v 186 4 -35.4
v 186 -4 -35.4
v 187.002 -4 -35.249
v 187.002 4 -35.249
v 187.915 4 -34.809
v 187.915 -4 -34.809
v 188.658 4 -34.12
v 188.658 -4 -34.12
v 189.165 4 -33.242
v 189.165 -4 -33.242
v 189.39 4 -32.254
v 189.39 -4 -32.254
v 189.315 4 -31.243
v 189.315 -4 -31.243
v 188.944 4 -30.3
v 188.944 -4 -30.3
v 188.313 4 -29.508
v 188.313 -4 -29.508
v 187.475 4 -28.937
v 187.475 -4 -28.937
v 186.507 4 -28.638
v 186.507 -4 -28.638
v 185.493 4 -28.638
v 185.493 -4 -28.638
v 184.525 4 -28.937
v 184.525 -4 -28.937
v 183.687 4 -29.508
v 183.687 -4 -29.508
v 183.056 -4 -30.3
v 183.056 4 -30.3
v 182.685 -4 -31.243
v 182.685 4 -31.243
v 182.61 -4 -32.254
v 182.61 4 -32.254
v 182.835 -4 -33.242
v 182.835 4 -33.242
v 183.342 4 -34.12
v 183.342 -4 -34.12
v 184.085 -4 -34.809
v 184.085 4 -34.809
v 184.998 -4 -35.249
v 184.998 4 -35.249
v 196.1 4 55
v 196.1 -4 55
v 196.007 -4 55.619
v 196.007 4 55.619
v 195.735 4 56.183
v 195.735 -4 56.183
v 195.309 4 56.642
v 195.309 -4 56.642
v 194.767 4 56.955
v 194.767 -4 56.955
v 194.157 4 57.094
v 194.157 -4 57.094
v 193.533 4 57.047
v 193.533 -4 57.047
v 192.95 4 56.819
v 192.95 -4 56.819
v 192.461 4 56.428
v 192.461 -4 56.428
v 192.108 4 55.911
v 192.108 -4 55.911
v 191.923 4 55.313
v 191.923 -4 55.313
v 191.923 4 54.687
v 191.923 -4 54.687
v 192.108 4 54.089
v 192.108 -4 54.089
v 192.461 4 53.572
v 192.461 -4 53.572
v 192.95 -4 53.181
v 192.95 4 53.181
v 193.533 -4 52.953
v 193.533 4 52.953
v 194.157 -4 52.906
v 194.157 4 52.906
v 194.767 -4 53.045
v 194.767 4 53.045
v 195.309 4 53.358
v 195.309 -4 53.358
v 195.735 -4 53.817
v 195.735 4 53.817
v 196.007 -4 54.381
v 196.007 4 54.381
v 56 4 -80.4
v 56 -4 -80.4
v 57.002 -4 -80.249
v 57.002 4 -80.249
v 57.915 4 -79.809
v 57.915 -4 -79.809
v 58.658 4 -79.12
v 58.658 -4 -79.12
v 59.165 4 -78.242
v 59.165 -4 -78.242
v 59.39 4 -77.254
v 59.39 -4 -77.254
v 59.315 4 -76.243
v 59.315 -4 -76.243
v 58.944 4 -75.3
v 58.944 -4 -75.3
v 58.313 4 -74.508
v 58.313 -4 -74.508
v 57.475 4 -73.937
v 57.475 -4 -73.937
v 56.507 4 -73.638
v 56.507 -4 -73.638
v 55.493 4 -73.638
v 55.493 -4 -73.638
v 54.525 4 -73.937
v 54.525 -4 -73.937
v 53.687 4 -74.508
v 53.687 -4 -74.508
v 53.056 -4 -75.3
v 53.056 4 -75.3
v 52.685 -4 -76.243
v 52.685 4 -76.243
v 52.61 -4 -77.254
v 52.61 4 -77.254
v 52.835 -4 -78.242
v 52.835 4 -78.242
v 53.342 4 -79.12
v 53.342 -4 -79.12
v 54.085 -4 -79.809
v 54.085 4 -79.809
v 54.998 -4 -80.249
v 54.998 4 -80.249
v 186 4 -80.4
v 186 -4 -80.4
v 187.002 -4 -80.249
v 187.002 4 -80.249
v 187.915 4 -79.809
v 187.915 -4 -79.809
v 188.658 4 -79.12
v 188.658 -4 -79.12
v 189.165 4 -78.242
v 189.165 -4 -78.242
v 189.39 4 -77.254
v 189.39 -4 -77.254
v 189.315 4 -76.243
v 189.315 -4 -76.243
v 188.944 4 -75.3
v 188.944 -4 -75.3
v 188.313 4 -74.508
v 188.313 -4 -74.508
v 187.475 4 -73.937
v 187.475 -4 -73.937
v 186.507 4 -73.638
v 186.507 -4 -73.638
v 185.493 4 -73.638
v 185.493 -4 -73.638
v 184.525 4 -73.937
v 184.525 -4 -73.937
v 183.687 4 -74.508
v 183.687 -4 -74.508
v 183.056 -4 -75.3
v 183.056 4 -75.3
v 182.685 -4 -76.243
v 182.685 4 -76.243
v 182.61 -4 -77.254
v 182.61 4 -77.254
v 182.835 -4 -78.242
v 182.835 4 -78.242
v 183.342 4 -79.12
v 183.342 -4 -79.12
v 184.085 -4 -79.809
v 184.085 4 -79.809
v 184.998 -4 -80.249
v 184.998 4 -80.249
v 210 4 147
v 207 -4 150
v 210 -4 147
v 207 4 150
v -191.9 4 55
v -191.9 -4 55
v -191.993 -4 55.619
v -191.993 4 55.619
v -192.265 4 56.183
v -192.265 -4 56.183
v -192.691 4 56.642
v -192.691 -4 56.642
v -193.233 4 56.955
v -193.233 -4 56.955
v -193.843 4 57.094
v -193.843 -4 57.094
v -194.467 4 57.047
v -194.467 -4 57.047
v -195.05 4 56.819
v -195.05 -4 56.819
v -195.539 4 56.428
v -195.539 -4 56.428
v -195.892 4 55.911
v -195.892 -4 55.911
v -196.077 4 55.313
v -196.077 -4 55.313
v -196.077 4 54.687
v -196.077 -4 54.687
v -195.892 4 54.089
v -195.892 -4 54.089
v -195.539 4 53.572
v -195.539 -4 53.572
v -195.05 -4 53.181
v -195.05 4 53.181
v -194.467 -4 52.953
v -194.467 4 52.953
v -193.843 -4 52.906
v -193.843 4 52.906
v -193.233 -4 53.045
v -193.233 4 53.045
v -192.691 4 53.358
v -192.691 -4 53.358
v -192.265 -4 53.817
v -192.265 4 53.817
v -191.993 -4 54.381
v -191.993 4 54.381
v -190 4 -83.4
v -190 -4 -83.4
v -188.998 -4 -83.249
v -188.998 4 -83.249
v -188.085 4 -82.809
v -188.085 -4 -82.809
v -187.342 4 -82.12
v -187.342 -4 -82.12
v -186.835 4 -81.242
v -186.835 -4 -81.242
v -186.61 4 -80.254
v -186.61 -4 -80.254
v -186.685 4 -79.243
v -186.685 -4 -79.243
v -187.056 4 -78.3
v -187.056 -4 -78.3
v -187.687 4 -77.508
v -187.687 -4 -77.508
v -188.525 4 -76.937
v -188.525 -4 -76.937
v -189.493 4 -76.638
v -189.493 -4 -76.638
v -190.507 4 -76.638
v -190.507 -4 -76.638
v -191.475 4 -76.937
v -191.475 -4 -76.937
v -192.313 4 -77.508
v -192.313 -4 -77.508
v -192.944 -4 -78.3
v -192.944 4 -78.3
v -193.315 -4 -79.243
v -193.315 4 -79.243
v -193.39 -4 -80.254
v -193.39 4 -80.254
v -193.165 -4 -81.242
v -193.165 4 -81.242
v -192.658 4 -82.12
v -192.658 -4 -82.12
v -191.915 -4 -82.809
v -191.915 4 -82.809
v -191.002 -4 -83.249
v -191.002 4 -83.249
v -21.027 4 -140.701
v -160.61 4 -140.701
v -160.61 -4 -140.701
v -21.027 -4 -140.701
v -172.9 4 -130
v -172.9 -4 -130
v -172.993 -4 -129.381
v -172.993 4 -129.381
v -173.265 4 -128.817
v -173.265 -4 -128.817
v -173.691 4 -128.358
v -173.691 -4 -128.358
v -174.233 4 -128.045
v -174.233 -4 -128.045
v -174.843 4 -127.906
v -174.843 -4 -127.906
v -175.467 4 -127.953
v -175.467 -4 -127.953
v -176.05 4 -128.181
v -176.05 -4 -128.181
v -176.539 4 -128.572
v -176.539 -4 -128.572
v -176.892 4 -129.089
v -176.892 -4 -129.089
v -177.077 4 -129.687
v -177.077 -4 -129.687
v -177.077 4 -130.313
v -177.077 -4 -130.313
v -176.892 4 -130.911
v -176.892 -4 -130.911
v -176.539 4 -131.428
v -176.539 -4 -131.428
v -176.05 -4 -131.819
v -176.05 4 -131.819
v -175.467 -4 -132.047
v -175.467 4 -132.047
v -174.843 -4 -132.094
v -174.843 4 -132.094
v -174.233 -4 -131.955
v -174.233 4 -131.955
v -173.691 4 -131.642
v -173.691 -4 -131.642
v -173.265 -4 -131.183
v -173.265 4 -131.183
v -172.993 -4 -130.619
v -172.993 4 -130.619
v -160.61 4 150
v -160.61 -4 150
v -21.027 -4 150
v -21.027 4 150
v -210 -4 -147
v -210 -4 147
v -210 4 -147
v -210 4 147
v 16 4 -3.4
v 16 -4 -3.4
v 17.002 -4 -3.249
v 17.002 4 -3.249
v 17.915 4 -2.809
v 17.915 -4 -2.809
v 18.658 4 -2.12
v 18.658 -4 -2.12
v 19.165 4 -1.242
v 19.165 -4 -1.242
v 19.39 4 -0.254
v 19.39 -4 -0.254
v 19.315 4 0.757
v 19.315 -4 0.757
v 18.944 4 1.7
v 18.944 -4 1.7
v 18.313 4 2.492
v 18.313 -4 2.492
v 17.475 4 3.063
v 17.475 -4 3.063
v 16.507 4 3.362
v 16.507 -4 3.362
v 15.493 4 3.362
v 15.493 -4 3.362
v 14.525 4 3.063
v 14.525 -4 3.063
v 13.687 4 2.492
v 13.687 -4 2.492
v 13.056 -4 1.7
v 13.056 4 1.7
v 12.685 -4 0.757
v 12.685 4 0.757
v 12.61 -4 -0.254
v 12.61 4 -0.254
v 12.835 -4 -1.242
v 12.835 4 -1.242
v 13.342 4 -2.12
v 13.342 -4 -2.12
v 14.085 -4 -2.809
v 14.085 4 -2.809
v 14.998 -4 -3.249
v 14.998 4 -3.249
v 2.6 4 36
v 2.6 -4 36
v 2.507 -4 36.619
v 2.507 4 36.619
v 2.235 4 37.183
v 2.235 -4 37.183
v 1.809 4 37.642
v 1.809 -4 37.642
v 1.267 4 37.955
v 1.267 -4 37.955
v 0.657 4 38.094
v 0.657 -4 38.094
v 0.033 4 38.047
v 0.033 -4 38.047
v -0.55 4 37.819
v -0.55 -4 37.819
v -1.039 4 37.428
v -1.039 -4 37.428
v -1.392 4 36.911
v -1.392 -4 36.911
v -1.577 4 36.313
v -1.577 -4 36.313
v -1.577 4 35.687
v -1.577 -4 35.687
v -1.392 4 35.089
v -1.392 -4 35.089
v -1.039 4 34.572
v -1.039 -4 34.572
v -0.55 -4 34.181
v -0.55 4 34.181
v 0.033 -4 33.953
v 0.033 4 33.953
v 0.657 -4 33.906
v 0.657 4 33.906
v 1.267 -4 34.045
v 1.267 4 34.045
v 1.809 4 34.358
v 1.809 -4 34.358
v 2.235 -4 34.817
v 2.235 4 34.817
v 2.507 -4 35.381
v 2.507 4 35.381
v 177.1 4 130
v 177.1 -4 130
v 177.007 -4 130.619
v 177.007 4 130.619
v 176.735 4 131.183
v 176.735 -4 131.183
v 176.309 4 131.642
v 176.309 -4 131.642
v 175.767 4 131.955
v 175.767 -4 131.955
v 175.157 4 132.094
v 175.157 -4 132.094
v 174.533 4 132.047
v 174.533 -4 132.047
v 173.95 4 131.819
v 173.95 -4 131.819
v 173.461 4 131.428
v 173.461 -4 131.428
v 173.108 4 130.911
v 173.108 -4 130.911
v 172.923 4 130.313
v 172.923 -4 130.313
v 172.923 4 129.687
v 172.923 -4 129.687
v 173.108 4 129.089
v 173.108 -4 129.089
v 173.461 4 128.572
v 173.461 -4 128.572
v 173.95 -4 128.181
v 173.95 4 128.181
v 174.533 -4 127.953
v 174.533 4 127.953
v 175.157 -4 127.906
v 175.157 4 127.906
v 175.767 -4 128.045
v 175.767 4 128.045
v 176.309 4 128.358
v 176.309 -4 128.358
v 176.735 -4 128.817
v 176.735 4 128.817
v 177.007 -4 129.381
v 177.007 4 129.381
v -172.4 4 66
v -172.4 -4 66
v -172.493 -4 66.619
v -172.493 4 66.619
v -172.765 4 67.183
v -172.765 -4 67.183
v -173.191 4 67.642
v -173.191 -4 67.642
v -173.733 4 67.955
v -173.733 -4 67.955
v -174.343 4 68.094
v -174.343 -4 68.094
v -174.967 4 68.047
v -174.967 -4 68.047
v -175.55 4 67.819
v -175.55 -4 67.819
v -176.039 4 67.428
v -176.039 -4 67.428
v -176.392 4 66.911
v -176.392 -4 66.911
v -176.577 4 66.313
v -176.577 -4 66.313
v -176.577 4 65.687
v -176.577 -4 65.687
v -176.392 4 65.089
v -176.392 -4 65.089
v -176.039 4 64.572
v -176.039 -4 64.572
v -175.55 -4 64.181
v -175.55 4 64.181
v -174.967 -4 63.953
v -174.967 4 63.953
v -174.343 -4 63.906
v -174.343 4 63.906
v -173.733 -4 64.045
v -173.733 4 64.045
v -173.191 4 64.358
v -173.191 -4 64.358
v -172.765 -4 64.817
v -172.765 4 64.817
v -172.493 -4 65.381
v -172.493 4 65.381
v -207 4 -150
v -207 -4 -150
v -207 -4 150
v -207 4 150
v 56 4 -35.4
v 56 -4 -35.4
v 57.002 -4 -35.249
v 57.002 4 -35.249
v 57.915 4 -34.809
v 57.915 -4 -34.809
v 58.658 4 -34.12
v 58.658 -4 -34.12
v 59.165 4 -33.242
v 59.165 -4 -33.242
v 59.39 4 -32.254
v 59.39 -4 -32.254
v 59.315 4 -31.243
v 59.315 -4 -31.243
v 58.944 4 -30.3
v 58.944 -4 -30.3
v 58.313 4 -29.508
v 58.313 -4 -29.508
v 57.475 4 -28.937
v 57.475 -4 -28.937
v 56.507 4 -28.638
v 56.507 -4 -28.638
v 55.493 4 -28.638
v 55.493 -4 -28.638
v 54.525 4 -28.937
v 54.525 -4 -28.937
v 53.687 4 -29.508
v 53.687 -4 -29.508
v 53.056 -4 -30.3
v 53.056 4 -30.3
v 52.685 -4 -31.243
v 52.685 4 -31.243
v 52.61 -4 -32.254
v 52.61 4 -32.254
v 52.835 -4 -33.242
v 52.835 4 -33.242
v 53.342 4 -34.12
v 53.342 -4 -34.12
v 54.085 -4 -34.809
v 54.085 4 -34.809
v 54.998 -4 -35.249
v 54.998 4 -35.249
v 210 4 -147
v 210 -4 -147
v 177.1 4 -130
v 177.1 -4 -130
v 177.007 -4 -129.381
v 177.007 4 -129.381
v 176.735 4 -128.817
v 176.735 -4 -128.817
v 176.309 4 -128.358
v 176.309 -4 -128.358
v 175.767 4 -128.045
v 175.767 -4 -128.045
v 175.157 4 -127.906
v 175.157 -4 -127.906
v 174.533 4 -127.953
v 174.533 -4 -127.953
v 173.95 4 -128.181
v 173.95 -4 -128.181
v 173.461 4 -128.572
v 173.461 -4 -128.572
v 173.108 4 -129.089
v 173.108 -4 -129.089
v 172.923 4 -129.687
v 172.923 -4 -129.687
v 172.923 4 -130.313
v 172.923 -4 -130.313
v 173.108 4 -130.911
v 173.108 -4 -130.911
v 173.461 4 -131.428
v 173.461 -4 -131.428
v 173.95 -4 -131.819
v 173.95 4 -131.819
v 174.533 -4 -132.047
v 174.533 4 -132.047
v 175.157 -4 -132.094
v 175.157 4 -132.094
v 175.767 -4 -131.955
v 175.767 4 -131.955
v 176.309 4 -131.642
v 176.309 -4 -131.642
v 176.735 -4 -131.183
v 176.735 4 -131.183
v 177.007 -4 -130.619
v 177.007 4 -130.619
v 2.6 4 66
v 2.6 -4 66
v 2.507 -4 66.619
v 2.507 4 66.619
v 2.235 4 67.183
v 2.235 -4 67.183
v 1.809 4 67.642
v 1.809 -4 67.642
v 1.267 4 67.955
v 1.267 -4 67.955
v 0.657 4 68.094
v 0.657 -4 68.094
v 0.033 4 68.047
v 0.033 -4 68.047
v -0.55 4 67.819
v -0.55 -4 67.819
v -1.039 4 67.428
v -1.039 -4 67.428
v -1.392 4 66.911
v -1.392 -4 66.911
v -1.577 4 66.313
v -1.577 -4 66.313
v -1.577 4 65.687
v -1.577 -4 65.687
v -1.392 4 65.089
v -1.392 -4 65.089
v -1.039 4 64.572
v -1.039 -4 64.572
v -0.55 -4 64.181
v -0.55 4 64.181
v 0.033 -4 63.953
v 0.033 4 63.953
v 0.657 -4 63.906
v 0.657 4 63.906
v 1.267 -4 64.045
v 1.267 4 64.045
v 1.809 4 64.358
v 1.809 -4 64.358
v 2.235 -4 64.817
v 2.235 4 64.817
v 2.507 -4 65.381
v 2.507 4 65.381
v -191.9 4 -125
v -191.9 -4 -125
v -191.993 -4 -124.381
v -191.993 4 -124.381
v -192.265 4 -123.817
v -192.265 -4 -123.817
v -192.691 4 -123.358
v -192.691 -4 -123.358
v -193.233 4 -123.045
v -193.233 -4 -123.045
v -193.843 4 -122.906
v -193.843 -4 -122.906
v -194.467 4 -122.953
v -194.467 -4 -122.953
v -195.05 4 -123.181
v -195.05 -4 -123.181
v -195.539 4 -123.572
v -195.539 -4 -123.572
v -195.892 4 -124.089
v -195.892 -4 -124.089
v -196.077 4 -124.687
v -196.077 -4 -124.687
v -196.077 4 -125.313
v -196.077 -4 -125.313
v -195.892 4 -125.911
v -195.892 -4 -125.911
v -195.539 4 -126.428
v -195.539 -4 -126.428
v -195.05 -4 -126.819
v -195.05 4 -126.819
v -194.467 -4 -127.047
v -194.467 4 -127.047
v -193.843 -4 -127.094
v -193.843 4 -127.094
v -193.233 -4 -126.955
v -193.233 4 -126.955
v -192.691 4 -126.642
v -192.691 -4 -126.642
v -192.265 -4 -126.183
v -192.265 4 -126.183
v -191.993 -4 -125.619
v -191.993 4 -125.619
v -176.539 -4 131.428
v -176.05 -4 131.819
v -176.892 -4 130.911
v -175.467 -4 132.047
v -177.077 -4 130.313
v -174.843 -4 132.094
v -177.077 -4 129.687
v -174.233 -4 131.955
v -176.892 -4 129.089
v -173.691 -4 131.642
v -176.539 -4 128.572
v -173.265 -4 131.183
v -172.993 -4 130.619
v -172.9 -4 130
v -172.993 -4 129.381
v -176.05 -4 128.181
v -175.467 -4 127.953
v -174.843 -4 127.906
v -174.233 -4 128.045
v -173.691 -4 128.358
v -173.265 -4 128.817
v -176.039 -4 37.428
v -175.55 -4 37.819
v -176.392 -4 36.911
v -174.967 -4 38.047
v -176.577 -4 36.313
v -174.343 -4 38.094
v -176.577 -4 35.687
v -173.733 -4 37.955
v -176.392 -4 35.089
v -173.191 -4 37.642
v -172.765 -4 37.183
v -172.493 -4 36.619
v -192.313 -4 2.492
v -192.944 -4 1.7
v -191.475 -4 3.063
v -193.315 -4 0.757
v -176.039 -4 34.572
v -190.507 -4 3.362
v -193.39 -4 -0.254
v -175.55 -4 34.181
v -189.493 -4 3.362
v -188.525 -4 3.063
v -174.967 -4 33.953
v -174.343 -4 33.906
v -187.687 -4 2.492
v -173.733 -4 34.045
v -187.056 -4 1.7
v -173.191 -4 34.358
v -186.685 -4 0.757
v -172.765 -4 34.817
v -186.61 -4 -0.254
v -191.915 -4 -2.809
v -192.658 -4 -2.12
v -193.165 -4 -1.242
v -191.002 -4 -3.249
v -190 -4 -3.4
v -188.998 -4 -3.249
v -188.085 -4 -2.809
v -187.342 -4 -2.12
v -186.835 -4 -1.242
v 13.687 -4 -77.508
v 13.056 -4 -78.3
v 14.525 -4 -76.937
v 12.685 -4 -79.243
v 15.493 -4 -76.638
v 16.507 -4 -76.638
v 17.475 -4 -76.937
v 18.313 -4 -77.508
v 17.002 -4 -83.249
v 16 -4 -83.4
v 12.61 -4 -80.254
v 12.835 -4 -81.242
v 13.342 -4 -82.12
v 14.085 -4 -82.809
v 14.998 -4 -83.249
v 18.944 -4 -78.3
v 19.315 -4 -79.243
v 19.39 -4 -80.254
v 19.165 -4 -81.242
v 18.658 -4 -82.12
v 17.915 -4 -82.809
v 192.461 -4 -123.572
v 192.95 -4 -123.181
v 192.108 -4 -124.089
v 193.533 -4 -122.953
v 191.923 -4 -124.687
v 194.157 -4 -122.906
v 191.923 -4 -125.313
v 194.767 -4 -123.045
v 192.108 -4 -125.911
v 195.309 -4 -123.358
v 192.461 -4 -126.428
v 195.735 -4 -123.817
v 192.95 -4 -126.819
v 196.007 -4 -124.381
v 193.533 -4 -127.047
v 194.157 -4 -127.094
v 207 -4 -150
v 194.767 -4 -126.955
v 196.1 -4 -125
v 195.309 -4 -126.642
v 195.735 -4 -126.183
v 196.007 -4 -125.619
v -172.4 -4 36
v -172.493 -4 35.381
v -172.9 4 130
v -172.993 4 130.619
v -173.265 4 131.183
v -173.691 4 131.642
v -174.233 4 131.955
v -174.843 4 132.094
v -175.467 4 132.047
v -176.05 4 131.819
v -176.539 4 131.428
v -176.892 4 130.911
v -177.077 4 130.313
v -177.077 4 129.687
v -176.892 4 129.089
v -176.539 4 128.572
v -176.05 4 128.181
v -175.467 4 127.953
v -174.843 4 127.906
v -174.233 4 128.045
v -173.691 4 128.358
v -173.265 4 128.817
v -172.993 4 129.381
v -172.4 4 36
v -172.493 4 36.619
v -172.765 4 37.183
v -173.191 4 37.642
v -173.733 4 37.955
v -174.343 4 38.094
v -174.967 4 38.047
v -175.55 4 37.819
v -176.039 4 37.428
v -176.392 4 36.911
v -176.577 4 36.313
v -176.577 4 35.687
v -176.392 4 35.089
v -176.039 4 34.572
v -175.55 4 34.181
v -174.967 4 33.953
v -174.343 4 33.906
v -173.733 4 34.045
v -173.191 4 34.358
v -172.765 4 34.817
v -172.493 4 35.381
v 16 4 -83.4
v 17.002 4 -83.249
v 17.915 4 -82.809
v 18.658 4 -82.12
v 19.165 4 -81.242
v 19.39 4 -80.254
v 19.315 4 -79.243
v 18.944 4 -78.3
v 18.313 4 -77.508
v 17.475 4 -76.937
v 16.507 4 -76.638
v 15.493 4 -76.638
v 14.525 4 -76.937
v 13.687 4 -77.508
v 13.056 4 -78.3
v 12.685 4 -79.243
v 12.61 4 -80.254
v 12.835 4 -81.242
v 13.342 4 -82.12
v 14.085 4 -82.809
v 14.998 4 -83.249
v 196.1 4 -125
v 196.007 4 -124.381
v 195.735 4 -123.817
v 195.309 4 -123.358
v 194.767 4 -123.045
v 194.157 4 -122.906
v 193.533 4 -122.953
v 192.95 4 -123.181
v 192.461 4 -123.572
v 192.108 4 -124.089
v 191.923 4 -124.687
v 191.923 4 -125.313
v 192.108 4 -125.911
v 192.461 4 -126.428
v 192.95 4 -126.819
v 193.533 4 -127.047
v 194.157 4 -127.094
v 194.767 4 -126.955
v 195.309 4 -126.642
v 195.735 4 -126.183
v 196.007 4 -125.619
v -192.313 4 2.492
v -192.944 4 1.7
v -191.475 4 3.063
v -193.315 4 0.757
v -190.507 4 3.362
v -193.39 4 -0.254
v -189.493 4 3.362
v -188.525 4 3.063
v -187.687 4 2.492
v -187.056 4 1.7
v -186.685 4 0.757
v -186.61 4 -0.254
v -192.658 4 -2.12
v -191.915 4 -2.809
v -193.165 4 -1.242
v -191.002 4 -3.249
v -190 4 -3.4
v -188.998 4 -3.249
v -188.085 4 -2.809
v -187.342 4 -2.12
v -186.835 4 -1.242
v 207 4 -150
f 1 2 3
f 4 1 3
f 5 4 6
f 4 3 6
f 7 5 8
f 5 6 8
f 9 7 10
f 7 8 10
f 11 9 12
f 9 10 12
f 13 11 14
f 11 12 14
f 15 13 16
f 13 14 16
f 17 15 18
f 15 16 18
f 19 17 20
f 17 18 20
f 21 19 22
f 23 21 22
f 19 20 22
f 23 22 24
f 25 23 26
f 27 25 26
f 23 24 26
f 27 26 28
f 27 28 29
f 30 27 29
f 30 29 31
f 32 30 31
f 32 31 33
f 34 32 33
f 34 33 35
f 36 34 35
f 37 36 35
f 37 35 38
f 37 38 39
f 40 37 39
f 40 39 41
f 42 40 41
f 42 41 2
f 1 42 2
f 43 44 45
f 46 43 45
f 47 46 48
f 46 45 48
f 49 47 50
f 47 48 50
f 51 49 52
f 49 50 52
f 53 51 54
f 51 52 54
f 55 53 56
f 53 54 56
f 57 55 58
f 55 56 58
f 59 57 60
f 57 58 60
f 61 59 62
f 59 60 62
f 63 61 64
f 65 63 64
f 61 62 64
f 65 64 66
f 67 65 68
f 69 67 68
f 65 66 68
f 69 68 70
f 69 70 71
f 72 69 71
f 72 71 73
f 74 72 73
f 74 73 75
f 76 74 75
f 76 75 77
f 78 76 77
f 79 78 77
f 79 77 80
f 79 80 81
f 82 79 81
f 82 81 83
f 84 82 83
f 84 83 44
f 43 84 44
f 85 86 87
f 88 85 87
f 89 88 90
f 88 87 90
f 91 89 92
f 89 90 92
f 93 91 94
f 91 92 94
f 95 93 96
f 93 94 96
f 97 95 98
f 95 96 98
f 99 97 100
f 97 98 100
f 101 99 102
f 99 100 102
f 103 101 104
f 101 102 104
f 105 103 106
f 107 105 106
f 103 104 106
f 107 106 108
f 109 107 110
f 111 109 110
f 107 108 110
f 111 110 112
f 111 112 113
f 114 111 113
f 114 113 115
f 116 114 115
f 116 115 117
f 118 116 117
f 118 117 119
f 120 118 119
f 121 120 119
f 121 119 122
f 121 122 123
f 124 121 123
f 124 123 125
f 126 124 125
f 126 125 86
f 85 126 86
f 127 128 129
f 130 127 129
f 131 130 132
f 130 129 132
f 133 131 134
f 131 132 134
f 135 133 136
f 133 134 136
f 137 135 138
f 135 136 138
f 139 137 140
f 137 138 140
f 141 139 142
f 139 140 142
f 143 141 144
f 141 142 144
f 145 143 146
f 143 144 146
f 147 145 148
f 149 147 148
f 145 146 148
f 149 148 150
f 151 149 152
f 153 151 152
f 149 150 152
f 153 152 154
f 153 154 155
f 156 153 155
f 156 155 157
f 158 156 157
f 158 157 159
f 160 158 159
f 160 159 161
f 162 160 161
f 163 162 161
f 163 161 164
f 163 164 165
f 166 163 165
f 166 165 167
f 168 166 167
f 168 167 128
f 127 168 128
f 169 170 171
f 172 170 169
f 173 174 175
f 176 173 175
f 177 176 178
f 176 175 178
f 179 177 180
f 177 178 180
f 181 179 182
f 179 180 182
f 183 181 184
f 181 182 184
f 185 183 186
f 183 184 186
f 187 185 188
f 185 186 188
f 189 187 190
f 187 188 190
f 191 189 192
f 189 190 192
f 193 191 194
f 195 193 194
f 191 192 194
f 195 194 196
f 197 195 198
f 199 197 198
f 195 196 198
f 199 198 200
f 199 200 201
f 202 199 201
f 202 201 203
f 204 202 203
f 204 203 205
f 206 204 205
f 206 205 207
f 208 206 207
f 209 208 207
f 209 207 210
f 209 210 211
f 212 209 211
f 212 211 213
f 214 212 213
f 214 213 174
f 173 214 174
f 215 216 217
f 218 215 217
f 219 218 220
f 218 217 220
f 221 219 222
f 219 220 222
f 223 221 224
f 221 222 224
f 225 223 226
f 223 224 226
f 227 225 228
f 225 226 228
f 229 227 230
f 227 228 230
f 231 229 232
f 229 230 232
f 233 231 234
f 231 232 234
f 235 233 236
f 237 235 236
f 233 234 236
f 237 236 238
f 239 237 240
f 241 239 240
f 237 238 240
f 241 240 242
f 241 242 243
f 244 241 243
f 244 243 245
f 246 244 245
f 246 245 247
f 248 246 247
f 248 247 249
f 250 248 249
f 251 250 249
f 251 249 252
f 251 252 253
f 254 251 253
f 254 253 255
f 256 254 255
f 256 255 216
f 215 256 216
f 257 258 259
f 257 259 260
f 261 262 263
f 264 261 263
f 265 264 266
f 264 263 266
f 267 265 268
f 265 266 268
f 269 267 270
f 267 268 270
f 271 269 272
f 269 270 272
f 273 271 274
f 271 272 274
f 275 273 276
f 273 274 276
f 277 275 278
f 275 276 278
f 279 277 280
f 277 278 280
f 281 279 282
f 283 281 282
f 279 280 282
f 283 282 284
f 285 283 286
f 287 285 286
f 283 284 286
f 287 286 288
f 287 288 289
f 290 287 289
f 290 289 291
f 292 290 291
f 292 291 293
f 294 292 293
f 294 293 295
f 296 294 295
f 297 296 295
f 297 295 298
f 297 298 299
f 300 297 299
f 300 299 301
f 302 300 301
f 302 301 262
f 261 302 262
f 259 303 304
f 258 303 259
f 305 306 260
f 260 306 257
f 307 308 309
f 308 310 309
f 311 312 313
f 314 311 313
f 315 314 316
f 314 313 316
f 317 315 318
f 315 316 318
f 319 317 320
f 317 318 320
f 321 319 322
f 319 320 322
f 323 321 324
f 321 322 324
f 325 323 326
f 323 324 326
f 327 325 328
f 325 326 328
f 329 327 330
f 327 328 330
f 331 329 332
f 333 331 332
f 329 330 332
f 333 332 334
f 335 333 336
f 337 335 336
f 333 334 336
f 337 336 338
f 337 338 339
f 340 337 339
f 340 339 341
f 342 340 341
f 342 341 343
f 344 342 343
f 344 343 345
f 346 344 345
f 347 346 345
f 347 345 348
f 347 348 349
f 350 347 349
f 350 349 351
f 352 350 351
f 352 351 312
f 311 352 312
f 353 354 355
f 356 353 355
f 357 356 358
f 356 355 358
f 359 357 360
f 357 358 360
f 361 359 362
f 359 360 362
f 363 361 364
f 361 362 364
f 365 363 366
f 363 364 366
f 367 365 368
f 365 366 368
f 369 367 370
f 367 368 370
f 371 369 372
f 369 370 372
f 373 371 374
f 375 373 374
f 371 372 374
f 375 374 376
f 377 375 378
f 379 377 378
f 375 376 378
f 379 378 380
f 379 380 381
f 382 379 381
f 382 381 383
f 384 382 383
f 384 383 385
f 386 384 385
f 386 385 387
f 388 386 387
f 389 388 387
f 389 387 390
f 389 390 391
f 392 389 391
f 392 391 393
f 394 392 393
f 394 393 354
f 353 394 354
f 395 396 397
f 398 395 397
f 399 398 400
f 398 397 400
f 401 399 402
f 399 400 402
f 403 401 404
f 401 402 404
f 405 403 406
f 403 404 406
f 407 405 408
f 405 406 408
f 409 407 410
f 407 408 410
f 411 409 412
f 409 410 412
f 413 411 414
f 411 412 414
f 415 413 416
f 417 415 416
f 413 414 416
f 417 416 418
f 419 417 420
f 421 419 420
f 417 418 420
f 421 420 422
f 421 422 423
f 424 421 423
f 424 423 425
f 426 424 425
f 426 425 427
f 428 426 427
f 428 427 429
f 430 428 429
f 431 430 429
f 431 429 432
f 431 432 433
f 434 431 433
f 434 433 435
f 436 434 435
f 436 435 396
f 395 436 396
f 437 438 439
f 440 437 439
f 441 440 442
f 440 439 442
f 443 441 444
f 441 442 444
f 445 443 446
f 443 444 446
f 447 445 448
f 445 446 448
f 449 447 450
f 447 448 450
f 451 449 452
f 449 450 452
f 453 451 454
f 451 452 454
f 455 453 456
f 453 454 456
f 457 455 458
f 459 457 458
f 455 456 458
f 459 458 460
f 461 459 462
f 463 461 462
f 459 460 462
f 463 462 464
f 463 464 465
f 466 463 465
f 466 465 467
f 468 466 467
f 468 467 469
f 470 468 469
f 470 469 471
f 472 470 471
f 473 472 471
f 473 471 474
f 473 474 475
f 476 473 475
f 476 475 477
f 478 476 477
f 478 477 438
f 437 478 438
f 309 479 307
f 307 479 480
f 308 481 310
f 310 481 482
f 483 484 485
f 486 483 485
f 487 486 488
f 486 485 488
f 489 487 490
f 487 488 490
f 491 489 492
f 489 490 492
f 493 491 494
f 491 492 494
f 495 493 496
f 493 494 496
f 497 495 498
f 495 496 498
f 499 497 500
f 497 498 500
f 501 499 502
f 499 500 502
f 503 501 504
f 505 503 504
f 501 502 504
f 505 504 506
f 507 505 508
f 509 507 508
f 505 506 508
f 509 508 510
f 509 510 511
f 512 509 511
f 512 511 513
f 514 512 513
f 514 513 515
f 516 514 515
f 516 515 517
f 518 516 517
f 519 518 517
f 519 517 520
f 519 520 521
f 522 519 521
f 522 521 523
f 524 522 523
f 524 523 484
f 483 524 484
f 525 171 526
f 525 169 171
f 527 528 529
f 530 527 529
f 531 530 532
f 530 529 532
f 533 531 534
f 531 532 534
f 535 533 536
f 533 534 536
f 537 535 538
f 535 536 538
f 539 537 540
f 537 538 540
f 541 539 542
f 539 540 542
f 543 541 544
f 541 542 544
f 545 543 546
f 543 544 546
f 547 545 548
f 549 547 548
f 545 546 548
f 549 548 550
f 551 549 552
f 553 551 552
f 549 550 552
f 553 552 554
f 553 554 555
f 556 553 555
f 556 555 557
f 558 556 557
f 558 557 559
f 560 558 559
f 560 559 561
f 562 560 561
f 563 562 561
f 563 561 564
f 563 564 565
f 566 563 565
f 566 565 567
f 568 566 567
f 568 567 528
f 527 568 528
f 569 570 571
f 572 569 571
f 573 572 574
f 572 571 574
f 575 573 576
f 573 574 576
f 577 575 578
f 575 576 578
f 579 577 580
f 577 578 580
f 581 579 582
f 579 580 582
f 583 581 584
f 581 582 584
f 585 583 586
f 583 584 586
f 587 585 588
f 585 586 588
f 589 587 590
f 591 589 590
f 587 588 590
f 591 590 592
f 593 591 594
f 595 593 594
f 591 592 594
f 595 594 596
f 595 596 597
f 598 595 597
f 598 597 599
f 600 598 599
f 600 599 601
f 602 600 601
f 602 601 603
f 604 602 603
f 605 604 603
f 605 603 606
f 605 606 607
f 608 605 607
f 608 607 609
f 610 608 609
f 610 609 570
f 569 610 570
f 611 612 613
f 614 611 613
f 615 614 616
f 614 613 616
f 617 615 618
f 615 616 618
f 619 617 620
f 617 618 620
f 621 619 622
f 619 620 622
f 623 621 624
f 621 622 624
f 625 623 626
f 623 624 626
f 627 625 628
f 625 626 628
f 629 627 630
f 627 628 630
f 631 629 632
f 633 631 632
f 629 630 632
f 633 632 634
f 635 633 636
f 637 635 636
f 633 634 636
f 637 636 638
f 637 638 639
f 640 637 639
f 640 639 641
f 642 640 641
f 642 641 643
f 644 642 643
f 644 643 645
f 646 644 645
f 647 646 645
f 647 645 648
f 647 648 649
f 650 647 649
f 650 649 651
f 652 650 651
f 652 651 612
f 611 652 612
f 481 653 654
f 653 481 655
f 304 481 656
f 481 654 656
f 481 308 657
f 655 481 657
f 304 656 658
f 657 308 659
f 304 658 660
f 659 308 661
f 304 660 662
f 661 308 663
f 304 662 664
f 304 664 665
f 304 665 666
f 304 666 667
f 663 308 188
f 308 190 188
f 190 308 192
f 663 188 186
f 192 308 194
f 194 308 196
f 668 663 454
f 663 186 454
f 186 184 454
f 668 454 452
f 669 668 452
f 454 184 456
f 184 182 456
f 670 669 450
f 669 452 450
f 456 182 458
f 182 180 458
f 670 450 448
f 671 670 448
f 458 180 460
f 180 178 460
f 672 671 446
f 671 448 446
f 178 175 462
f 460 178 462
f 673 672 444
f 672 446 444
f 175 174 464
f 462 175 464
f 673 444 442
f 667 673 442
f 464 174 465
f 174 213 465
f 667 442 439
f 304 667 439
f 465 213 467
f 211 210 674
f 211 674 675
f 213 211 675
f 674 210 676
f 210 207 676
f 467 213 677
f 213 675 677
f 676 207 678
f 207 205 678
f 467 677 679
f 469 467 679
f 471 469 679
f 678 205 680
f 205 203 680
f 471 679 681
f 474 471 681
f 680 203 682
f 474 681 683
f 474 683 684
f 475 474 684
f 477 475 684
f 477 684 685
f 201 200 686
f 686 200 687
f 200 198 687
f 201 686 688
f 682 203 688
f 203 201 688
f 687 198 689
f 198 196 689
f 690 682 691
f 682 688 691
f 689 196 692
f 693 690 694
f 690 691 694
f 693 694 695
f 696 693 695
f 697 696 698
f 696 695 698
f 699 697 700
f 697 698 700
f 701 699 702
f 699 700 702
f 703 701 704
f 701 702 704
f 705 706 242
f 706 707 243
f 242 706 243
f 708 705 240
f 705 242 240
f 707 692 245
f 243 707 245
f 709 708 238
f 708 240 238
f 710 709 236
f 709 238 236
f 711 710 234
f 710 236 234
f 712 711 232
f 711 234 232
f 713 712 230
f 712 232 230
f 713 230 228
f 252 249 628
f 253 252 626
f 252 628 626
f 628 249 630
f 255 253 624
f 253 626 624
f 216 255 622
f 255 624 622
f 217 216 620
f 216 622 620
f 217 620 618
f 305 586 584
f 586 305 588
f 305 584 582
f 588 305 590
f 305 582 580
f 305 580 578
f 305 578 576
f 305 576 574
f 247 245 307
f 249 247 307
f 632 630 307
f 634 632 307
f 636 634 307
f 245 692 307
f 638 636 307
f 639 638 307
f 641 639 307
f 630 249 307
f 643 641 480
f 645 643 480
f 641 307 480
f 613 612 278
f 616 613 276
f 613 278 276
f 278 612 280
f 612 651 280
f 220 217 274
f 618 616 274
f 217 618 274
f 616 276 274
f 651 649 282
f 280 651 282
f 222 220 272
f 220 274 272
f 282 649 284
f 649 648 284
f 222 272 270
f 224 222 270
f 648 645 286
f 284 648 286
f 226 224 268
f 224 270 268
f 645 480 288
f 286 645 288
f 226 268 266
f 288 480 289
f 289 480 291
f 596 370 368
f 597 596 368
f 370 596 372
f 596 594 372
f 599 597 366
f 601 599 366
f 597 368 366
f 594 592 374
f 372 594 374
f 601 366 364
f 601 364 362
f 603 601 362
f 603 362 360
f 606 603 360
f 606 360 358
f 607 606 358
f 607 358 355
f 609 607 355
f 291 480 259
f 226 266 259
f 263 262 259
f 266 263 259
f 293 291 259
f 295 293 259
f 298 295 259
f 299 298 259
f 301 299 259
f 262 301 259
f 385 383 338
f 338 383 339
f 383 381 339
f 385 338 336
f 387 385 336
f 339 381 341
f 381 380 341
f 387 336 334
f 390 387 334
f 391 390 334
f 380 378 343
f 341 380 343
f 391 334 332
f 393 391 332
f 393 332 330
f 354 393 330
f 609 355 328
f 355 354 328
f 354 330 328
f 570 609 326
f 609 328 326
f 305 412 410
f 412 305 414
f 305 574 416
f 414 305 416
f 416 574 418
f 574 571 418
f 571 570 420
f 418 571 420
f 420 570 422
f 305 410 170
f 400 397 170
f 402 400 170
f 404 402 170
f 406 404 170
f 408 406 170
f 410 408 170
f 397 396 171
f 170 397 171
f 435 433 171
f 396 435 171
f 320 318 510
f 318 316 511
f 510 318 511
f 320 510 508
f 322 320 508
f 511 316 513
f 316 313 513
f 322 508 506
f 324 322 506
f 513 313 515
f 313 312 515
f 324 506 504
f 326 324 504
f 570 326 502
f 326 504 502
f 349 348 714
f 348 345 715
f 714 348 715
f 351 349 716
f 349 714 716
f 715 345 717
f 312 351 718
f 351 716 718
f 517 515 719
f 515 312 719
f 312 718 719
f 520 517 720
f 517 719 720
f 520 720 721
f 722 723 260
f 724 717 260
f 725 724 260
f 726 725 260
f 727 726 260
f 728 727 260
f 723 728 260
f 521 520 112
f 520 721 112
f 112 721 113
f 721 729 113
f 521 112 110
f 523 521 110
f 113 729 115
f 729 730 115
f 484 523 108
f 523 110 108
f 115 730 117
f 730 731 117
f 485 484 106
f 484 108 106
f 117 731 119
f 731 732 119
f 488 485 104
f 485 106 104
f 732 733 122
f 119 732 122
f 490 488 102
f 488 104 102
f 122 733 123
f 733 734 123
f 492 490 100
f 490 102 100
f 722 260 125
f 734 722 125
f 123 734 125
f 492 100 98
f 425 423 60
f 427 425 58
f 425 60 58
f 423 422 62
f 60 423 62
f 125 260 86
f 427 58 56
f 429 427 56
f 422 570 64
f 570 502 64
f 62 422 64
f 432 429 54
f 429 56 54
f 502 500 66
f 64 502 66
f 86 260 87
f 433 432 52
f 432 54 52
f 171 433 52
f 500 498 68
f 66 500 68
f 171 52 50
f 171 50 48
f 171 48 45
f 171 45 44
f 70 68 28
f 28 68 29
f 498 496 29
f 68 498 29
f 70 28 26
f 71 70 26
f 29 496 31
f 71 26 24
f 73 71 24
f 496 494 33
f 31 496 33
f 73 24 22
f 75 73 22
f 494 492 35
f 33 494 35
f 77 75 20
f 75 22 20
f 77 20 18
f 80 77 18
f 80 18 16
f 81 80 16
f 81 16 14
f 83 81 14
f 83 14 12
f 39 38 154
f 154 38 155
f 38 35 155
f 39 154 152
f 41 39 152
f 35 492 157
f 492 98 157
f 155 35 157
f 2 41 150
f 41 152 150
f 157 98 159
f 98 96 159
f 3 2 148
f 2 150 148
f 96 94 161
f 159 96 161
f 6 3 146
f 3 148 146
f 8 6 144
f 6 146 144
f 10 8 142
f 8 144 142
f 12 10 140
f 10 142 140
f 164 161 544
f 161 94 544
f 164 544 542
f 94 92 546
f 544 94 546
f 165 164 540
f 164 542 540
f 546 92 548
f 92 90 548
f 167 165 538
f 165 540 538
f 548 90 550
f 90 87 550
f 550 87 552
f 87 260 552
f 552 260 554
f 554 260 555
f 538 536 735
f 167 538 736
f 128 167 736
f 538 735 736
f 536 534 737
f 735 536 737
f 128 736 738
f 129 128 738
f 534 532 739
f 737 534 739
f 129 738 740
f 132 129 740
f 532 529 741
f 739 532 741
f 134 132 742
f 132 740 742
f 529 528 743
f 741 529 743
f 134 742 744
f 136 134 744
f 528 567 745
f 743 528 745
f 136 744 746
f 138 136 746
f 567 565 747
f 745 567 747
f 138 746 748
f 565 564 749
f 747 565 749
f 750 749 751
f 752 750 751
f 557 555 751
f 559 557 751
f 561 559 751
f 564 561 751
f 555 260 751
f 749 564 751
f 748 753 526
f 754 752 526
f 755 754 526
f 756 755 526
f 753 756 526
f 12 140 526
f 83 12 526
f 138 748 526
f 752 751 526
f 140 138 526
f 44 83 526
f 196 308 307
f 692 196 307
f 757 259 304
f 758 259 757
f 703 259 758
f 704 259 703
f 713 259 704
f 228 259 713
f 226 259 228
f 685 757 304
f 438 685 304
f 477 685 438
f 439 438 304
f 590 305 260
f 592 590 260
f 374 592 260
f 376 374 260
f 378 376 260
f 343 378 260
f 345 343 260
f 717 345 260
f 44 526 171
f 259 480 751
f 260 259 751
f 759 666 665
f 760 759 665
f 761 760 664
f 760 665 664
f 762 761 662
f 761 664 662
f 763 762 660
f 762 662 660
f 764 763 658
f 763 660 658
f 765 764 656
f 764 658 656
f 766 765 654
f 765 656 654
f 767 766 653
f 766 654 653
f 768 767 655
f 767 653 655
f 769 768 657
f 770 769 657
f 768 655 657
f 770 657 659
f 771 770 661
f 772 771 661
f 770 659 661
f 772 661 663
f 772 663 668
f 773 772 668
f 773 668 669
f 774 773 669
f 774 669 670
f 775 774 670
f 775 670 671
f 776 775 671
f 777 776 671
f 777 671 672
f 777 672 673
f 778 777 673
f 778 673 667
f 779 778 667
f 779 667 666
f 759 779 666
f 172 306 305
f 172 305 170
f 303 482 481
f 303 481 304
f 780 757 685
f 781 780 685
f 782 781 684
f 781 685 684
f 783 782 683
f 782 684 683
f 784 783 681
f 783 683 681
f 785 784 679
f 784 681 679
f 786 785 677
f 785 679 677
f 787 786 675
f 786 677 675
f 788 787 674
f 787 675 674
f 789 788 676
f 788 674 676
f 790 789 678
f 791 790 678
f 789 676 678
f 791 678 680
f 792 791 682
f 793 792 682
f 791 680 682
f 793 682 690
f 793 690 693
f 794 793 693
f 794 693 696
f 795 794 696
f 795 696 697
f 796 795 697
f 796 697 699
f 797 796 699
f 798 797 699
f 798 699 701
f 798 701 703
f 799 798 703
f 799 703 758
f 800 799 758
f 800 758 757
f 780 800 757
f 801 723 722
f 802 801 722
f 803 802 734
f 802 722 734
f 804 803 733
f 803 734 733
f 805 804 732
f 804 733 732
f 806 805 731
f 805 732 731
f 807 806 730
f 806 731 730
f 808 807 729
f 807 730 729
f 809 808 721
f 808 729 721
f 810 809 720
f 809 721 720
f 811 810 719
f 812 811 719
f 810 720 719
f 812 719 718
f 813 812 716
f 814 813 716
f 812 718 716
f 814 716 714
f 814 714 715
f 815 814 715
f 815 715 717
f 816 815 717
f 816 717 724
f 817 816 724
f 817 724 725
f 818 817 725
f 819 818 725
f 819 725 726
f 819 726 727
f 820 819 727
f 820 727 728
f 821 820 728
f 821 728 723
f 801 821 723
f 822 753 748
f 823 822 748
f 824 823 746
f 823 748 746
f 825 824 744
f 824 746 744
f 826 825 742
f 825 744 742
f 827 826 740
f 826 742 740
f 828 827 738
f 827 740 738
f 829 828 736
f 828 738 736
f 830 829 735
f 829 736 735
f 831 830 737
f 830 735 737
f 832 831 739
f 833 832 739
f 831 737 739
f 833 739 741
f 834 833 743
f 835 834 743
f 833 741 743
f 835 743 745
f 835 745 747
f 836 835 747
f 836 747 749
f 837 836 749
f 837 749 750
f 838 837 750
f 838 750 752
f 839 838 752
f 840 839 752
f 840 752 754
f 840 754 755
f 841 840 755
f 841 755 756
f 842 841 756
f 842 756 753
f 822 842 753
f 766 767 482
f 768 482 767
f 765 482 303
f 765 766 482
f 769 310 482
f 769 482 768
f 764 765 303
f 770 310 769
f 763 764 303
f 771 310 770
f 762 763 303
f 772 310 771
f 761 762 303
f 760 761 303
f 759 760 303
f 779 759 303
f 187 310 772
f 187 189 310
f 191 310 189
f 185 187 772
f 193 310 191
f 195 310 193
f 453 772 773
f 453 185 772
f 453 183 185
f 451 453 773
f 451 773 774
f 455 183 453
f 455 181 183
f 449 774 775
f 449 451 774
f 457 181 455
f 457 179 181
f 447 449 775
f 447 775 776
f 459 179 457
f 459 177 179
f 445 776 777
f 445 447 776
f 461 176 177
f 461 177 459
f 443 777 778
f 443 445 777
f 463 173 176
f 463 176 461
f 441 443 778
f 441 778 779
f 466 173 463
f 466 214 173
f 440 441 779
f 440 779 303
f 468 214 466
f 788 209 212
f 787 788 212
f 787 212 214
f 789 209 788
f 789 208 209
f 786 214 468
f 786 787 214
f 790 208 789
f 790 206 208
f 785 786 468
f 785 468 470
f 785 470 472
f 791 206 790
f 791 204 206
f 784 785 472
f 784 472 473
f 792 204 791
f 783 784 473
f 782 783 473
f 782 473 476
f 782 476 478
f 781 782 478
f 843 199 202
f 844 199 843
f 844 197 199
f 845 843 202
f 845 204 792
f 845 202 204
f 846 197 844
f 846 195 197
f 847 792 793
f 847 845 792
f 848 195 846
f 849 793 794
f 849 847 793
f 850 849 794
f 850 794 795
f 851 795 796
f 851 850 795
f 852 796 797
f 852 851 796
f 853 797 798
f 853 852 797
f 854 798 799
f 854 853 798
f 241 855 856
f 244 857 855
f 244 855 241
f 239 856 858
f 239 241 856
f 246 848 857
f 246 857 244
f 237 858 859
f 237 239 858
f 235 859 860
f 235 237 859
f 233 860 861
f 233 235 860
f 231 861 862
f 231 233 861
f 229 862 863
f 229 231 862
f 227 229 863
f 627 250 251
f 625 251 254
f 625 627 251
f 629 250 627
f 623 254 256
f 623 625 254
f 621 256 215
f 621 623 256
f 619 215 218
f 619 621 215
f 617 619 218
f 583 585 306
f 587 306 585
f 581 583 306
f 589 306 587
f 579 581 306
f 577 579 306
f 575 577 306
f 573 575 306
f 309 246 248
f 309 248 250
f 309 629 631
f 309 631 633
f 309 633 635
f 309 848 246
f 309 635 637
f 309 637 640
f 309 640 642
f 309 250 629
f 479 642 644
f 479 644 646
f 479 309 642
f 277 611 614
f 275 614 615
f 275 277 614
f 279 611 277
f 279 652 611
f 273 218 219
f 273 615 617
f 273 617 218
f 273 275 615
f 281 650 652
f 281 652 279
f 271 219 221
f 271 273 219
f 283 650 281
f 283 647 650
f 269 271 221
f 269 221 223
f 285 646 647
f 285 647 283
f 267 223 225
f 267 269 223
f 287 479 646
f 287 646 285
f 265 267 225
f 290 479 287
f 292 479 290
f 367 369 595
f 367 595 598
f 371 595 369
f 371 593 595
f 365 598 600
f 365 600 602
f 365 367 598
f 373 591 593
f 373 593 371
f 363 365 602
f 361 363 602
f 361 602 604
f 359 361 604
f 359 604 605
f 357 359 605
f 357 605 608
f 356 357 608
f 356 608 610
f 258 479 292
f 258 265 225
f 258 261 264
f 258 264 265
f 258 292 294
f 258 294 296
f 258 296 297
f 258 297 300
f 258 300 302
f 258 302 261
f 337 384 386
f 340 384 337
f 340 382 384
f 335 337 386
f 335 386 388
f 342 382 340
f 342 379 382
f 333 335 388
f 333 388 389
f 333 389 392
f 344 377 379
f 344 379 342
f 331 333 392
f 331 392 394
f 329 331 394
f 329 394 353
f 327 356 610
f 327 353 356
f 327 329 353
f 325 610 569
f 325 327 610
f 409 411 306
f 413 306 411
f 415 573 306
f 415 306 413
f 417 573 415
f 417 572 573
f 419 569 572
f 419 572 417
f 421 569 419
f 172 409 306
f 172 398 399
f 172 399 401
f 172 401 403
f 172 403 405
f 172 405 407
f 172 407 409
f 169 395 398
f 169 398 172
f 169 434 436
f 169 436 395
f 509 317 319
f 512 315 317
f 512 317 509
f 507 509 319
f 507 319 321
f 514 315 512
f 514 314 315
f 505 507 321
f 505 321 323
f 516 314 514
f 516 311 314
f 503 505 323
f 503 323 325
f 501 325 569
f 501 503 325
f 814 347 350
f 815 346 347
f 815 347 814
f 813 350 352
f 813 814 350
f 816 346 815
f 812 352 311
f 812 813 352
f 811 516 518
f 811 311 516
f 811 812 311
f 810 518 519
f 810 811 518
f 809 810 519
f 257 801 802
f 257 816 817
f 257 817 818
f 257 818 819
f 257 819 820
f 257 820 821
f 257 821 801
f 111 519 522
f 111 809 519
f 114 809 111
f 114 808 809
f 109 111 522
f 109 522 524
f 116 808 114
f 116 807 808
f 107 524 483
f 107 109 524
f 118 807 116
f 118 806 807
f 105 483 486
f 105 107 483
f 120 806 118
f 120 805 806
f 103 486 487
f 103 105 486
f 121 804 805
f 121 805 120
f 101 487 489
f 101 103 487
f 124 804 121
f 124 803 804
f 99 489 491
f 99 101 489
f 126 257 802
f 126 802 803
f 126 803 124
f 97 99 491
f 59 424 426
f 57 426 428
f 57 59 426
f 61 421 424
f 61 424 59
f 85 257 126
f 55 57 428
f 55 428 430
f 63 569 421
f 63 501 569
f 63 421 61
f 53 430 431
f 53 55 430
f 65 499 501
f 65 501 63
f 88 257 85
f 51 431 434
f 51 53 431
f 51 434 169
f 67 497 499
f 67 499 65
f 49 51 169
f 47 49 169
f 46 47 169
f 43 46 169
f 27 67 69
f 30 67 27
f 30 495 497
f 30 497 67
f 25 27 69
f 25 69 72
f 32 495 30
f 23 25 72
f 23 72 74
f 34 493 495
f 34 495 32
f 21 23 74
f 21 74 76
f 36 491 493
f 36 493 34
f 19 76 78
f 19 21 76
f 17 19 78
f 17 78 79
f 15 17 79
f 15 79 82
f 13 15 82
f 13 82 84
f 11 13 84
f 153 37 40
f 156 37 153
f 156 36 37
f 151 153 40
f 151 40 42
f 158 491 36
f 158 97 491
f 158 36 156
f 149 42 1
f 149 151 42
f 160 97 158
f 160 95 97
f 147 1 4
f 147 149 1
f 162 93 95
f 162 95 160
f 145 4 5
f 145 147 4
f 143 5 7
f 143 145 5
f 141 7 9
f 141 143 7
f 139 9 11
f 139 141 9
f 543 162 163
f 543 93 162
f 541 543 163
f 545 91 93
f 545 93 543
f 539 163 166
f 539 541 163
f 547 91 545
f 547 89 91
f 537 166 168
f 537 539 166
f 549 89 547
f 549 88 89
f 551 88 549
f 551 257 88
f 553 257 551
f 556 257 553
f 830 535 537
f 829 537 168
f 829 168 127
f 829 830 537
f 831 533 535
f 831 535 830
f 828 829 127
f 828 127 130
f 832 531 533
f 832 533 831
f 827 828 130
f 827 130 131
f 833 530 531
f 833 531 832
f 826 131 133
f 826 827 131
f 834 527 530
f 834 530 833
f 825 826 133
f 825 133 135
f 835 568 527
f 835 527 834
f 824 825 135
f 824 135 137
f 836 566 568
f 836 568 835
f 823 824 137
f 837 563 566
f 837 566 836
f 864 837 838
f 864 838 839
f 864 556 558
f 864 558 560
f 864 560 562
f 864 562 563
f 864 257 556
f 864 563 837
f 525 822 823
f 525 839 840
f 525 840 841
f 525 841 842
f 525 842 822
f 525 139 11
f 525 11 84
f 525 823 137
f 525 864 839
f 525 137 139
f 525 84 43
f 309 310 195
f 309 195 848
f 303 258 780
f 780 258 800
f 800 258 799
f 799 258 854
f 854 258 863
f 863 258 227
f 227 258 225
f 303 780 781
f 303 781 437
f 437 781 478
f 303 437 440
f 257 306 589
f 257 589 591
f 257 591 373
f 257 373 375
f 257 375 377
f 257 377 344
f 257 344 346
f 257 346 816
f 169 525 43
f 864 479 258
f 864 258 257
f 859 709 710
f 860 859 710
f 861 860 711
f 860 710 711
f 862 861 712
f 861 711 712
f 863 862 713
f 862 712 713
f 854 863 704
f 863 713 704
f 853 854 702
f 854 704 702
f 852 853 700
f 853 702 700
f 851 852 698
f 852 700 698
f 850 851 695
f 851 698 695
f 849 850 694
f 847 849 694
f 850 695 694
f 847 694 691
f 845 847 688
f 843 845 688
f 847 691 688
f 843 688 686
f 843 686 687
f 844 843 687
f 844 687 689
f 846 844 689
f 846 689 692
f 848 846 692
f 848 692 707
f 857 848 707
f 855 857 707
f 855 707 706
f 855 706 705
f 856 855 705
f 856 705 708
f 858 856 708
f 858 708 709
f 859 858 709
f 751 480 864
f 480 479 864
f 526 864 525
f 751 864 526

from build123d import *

# Parameters (mm, degrees)
SKETCH1_W             = 420
SKETCH1_H             = 300
BOSS_EXTRUDE1_DEPTH   = 4
CHAMFER1_SIZE         = 3
M8_TAPPED_HOLE1_D     = 6.8
M8_TAPPED_HOLE1_DEPTH = 19.75
M8_TAPPED_HOLE1_TIP   = 2.042926105
M5_TAPPED_HOLE1_D     = 4.2
M5_TAPPED_HOLE1_DEPTH = 12.4
M5_TAPPED_HOLE1_TIP   = 1.2618073
SKETCH6_W             = 139.582677991
SKETCH6_H             = 303.771276781
CUT_EXTRUDE1_DEPTH    = 10


with BuildPart() as part:
    # Sketch1 → Boss-Extrude1 (new, symmetric)
    with BuildSketch(Plane(origin=(0, 0, 0), x_dir=(1, 0, 0), z_dir=(0, 1, 0))):
        Rectangle(SKETCH1_W, SKETCH1_H)
    extrude(amount=BOSS_EXTRUDE1_DEPTH, both=True)

    # Chamfer1
    chamfer1_edges = [part.edges().sort_by_distance(p)[0] for p in [
        (210, 0, 150),
        (-210, 0, 150),
        (-210, 0, -150),
        (210, 0, -150),
    ]]
    chamfer(chamfer1_edges, length=CHAMFER1_SIZE)

    # M8 Tapped Hole1
    with Locations(Plane(origin=(-190, 4, -80), x_dir=(0, 0, 1), z_dir=(0, 1, 0))):
        with Locations((0, 0), (0, 206), (80, 206), (80, 0), (48, 246), (48, 376), (3, 376), (3, 246)):
            Hole(M8_TAPPED_HOLE1_D / 2, depth=M8_TAPPED_HOLE1_DEPTH)
            with Locations((0, 0, -(M8_TAPPED_HOLE1_DEPTH + M8_TAPPED_HOLE1_TIP / 2))):  # 118° drill point
                Cone(0, M8_TAPPED_HOLE1_D / 2, M8_TAPPED_HOLE1_TIP, mode=Mode.SUBTRACT)

    # M5 Tapped Hole1
    with Locations(Plane(origin=(0, 4, 0), x_dir=(-1, 0, 0), z_dir=(0, 1, 0))):
        with Locations((175, 130), (-175, 130), (-175, -130), (175, -130), (194, -125), (194, 55), (-194, 55), (-194, -125), (174.5, 66), (174.5, 36), (-0.5, 36), (-0.5, 66)):
            Hole(M5_TAPPED_HOLE1_D / 2, depth=M5_TAPPED_HOLE1_DEPTH)
            with Locations((0, 0, -(M5_TAPPED_HOLE1_DEPTH + M5_TAPPED_HOLE1_TIP / 2))):  # 118° drill point
                Cone(0, M5_TAPPED_HOLE1_D / 2, M5_TAPPED_HOLE1_TIP, mode=Mode.SUBTRACT)

    # Sketch6 → Cut-Extrude1 (cut)
    with BuildSketch(Plane(origin=(0, 4, 0), x_dir=(1, 0, 0), z_dir=(0, 1, 0))):
        with Locations((-90.81821677, -11.184509455)):
            Rectangle(SKETCH6_W, SKETCH6_H)
    extrude(amount=-CUT_EXTRUDE1_DEPTH, mode=Mode.SUBTRACT)


solid = part.part
